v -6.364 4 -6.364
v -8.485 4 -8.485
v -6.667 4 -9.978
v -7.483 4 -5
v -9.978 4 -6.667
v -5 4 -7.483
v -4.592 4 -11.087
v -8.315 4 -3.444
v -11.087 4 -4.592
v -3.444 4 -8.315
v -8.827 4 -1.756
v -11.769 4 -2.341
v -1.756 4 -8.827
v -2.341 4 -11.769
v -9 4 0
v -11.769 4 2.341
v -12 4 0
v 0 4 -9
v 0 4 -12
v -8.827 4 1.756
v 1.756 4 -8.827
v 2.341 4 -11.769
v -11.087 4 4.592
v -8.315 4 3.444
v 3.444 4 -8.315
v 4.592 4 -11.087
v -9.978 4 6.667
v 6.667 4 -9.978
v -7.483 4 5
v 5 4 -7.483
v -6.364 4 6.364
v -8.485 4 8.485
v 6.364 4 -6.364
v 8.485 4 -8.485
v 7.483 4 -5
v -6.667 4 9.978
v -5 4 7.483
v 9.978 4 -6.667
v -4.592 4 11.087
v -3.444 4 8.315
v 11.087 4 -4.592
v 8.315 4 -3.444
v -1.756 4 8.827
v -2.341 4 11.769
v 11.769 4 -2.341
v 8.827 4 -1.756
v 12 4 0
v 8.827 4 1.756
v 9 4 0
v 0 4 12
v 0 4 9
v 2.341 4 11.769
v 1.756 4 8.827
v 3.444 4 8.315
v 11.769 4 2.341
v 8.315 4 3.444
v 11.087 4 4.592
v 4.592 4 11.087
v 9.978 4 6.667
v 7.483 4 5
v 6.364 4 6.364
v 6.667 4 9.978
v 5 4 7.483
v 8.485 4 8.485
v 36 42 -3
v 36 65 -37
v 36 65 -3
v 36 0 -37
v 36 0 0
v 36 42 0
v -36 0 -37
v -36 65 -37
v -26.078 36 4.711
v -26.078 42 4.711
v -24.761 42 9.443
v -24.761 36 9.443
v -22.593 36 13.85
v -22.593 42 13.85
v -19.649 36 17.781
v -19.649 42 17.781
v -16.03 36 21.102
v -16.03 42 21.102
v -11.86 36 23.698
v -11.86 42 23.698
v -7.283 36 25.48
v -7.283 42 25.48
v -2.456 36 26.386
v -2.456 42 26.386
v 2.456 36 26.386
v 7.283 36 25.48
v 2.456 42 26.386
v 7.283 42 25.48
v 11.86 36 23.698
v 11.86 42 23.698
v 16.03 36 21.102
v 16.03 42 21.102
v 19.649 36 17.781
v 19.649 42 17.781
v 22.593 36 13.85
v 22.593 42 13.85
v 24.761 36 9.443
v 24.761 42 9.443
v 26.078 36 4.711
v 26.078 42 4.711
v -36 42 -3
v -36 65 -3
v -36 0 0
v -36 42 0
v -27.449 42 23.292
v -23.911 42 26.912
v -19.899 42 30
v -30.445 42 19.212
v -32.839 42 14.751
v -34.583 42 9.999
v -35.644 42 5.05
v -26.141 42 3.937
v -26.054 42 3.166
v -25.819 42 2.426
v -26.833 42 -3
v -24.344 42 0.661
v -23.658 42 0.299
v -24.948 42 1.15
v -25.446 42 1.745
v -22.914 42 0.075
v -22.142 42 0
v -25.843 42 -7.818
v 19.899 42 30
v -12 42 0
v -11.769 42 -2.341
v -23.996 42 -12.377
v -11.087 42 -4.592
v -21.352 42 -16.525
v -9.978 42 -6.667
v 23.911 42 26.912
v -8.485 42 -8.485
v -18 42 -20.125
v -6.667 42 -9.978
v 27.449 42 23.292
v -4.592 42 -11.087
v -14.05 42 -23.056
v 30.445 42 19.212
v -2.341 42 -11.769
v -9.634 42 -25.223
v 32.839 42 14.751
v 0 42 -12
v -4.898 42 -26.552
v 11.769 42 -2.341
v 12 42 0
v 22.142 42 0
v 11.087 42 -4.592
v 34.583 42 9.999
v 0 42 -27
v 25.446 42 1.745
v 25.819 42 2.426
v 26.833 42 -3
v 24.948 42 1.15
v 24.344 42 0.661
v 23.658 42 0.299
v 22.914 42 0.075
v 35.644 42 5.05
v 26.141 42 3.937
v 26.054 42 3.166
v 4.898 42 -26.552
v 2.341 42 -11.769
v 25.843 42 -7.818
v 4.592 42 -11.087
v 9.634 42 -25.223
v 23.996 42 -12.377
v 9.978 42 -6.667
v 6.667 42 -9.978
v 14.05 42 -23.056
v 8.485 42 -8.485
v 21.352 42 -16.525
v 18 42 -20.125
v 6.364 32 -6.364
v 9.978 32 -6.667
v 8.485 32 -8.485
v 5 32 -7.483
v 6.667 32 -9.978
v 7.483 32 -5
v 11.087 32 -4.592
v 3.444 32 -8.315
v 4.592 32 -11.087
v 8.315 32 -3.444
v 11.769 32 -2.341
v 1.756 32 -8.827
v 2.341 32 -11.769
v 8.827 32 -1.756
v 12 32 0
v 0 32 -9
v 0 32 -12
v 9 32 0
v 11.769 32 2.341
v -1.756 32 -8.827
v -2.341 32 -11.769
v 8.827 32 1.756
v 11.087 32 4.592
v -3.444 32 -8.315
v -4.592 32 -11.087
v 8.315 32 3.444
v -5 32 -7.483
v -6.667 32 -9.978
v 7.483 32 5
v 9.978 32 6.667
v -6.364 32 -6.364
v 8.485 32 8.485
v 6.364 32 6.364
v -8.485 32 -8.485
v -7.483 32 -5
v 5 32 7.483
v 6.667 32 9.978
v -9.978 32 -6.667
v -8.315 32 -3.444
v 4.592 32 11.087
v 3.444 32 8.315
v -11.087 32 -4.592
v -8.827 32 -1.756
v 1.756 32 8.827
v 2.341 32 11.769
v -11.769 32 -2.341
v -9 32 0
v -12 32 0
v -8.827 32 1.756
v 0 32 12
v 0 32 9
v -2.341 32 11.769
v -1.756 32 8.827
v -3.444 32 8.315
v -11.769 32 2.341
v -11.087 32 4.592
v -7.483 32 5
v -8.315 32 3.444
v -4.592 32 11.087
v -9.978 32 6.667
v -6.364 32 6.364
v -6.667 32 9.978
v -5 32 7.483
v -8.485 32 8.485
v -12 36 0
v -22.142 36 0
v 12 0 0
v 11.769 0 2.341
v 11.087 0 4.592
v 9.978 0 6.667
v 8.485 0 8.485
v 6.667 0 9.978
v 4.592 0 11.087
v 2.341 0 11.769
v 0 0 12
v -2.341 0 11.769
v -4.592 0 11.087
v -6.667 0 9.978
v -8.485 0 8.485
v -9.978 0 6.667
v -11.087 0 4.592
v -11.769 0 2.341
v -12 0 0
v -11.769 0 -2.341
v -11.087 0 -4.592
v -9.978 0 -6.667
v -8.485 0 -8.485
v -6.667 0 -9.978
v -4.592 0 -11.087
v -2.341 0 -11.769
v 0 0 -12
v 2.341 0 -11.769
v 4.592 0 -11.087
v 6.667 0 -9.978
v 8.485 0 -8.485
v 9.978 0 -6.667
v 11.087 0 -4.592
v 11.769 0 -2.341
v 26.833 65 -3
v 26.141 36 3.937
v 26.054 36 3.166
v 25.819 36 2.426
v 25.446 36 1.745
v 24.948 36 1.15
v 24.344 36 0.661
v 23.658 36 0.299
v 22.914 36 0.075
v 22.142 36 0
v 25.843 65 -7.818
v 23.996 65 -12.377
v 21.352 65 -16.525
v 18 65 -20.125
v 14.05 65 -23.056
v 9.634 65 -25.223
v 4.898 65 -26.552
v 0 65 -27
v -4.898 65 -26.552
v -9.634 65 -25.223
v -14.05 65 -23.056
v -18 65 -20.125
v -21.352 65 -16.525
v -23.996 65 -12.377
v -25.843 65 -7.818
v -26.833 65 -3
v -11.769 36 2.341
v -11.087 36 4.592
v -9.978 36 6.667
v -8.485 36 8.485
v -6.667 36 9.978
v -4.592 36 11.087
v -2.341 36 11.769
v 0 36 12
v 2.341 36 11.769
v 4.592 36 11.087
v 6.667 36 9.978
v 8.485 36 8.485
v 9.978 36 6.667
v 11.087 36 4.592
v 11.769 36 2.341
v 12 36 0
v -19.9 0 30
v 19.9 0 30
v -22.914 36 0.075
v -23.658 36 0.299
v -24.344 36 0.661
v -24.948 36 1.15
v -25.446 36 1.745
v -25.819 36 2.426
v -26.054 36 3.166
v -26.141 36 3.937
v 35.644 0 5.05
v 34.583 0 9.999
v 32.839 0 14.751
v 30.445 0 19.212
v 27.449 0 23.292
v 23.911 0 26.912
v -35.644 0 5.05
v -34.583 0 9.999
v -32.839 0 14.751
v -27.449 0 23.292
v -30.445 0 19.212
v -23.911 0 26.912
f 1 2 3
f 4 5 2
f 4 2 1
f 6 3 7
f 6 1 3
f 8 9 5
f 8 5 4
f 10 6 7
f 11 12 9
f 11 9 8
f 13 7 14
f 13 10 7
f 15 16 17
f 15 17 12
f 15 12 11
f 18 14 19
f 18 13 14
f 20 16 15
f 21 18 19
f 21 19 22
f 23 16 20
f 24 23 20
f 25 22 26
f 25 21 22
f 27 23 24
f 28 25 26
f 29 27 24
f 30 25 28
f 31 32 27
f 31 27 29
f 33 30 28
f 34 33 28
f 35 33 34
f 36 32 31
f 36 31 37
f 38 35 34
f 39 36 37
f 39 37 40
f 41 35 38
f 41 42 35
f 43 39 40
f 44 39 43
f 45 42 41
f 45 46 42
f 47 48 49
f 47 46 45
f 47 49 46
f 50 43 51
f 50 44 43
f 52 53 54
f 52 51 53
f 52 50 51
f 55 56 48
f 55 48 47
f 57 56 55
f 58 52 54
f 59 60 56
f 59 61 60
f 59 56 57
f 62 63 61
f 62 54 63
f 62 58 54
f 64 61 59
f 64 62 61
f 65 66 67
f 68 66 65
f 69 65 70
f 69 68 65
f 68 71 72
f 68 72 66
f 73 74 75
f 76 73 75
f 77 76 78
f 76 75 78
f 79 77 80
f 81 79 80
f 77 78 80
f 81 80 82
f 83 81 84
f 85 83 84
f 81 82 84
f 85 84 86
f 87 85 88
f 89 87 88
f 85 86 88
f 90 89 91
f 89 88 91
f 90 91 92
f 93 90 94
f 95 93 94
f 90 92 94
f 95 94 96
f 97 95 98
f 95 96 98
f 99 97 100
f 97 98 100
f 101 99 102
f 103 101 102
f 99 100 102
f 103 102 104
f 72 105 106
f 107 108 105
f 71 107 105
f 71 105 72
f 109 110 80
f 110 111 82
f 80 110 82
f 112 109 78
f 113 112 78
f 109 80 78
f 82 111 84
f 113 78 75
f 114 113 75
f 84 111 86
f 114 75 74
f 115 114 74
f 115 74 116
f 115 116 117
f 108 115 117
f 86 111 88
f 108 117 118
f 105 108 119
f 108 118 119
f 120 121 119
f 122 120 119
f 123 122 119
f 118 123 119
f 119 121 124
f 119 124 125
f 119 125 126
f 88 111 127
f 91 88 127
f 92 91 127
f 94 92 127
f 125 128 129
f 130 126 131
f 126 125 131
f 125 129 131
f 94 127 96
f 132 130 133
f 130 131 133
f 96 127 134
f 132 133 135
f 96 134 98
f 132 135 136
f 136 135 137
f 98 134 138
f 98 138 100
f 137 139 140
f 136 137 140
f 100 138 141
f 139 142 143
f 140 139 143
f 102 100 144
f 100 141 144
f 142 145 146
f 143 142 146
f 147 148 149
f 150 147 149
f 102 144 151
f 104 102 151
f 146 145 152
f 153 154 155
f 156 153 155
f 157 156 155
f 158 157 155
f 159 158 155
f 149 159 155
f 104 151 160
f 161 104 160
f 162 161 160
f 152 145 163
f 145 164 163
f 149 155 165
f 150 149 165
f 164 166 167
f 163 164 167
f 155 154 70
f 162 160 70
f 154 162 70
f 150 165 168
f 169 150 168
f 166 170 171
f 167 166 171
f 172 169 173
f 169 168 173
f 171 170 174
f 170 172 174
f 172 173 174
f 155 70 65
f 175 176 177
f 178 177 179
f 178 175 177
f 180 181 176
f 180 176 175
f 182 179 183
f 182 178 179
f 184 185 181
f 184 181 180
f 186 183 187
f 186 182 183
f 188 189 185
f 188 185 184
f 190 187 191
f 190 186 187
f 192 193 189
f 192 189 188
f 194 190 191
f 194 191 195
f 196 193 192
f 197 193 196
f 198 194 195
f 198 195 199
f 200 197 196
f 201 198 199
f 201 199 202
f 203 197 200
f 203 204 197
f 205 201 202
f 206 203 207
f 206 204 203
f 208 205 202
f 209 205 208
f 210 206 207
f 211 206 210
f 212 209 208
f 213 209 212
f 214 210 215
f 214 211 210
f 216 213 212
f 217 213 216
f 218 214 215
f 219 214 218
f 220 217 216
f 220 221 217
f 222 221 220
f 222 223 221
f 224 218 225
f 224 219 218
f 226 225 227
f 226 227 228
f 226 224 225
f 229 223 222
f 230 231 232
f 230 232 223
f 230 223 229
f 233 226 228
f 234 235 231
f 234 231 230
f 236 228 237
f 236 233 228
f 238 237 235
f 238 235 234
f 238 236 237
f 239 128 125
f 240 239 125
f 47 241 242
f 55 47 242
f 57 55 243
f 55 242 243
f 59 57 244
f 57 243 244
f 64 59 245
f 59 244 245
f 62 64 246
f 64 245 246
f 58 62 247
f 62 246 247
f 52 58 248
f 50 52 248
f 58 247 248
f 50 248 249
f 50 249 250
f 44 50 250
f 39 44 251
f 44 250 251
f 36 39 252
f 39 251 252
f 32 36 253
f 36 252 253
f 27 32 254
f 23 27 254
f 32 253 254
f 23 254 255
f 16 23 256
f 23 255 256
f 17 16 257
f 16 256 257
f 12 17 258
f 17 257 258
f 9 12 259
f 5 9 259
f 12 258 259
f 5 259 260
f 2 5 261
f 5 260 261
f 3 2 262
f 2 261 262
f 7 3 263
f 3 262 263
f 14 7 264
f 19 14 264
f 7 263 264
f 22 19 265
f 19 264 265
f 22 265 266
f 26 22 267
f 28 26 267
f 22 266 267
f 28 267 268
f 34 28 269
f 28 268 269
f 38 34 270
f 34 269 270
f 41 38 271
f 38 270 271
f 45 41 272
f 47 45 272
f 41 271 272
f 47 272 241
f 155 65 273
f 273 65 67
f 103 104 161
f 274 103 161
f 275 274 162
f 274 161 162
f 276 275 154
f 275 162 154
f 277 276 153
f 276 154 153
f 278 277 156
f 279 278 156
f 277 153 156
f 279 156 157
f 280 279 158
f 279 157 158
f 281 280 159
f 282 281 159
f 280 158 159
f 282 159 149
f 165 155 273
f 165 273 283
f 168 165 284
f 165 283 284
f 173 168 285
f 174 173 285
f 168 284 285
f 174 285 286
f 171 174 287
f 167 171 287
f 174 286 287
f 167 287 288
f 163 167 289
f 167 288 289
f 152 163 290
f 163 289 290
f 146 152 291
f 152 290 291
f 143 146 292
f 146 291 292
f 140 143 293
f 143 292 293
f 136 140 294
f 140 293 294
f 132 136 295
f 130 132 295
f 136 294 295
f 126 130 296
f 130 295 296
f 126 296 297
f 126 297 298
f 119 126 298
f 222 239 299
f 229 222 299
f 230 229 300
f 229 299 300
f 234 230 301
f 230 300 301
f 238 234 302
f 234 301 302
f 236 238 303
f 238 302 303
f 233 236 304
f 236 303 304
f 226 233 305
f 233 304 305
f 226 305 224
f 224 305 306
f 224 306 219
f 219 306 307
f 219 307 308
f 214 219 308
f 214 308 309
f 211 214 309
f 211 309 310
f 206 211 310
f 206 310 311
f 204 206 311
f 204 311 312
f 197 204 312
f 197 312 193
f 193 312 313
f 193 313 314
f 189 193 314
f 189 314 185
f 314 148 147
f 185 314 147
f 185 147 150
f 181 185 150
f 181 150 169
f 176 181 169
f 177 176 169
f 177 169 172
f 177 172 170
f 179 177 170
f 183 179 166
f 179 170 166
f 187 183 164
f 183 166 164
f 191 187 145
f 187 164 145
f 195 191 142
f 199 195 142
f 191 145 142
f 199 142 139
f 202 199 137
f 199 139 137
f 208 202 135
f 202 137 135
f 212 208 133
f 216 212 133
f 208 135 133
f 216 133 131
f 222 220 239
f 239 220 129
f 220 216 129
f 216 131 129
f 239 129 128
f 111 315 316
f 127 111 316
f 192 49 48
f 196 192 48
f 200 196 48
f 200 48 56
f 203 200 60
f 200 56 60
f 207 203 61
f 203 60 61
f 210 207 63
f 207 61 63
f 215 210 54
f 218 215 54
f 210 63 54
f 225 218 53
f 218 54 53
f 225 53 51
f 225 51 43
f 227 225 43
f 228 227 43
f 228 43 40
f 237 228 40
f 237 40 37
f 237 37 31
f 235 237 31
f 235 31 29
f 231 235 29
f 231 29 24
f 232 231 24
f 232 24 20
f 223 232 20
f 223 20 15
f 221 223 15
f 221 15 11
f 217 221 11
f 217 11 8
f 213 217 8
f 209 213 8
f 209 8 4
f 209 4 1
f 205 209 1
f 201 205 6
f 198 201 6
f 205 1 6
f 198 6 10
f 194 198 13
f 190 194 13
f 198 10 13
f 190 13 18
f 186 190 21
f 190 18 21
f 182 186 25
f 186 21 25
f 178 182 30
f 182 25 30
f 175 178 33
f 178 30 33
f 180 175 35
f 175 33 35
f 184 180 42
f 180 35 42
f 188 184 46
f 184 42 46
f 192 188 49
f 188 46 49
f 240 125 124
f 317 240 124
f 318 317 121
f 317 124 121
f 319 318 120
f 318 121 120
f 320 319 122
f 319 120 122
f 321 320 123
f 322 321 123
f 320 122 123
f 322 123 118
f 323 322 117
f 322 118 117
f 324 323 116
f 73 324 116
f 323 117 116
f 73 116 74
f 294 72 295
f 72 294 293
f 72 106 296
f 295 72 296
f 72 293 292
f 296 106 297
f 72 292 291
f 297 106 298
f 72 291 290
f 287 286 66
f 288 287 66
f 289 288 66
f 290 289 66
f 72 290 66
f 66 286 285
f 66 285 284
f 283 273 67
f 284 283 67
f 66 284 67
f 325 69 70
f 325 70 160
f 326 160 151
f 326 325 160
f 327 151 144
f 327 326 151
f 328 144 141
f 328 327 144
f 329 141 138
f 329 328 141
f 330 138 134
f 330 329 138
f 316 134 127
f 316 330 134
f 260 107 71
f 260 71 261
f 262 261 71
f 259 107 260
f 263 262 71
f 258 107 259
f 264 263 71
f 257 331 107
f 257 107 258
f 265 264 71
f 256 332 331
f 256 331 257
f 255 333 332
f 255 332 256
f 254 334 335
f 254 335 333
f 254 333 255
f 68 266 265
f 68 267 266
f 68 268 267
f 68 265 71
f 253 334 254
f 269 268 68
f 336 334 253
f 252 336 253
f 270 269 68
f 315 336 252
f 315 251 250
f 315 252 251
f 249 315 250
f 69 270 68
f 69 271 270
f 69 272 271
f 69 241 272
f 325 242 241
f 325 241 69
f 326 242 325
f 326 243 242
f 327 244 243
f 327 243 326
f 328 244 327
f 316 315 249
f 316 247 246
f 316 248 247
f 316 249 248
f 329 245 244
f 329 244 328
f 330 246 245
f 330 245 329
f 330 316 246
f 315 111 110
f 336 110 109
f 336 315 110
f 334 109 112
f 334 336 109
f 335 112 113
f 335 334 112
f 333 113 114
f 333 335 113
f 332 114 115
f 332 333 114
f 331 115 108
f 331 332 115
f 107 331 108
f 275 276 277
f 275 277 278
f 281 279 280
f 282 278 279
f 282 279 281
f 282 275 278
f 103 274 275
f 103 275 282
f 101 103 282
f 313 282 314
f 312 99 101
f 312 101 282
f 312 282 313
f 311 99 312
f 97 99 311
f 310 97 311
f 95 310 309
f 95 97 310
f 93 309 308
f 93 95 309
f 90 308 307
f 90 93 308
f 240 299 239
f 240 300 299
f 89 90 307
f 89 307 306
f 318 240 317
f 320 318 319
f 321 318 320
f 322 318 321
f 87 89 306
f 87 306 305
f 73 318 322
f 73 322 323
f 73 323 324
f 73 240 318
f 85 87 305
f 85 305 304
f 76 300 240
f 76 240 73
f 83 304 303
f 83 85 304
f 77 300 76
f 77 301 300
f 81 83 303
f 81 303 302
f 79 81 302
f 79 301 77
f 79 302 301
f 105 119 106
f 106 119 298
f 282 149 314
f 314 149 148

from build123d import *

# Parameters (mm, degrees)
F0_R      = 9
F1_DEPTH  = 65
F2_W      = 23
F2_H      = 36
F2_H_2    = 3
F3_DEPTH  = 72
F4_R      = 12
F5_DEPTH  = 4
F6_R      = 27
F7_DEPTH  = 23
F8_R      = 12
F9_DEPTH  = 10
F11_DEPTH = 6
F13_DEPTH = 65


with BuildPart() as f1:
    # F0 (on Front) → F1 (new body)
    with BuildSketch(Plane.XZ):
        with BuildLine():
            Line((36, -37), (36, 0))
            ThreePointArc((36, 0), (0, 36), (-36, 0))
            Line((-36, 0), (-36, -37))
            Line((-36, -37), (36, -37))
        make_face()
        Circle(F0_R, mode=Mode.SUBTRACT)
    extrude(amount=-F1_DEPTH)

    # F2 (on face) → F3 (cut)
    with BuildSketch(Plane.YZ.offset(36)):
        with Locations((53.5, 18)):
            Rectangle(F2_W, F2_H)
        with Locations((53.5, -1.5)):
            Rectangle(F2_W, F2_H_2)
    extrude(amount=-F3_DEPTH, mode=Mode.SUBTRACT)

    # F4 (on face) → F5 (cut)
    with BuildSketch(Plane.XZ):
        Circle(F4_R)
    extrude(amount=-F5_DEPTH, mode=Mode.SUBTRACT)

    # F6 (on face) → F7 (cut)
    with BuildSketch(Plane(origin=(0, 65, 0), x_dir=(-1, 0, 0), z_dir=(0, 1, 0))):
        Circle(F6_R)
    extrude(amount=-F7_DEPTH, mode=Mode.SUBTRACT)

    # F8 (on face) → F9 (cut)
    with BuildSketch(Plane(origin=(0, 42, 0), x_dir=(-1, 0, 0), z_dir=(0, 1, 0))):
        Circle(F8_R)
    extrude(amount=-F9_DEPTH, mode=Mode.SUBTRACT)

    # F10 (on face) → F11 (cut)
    with BuildSketch(Plane(origin=(0, 42, 0), x_dir=(-1, 0, 0), z_dir=(0, 1, 0))):
        with BuildLine():
            ThreePointArc((22.1415898255, 0), (25.2111536743, 1.4352821251), (26.0778724611, 4.7111111111))
            ThreePointArc((26.0778724611, 4.7111111111), (0, 26.5), (-26.0778724611, 4.7111111111))
            ThreePointArc((-26.0778724611, 4.7111111111), (-25.2111536743, 1.4352821251), (-22.1415898255, 0))
            Line((-22.1415898255, 0), (22.1415898255, 0))
        make_face()
    extrude(amount=-F11_DEPTH, mode=Mode.SUBTRACT)

    # F12 (on face) → F13 (cut)
    with BuildSketch(Plane.XZ):
        with BuildLine():
            ThreePointArc((19.8995, 30.0001649954), (0, 36), (-19.8995, 30.0001649954))
            Line((-19.8995, 30.0001649954), (19.8995, 30.0001649954))
        make_face()
    extrude(amount=-F13_DEPTH, mode=Mode.SUBTRACT)


solid = f1.part
